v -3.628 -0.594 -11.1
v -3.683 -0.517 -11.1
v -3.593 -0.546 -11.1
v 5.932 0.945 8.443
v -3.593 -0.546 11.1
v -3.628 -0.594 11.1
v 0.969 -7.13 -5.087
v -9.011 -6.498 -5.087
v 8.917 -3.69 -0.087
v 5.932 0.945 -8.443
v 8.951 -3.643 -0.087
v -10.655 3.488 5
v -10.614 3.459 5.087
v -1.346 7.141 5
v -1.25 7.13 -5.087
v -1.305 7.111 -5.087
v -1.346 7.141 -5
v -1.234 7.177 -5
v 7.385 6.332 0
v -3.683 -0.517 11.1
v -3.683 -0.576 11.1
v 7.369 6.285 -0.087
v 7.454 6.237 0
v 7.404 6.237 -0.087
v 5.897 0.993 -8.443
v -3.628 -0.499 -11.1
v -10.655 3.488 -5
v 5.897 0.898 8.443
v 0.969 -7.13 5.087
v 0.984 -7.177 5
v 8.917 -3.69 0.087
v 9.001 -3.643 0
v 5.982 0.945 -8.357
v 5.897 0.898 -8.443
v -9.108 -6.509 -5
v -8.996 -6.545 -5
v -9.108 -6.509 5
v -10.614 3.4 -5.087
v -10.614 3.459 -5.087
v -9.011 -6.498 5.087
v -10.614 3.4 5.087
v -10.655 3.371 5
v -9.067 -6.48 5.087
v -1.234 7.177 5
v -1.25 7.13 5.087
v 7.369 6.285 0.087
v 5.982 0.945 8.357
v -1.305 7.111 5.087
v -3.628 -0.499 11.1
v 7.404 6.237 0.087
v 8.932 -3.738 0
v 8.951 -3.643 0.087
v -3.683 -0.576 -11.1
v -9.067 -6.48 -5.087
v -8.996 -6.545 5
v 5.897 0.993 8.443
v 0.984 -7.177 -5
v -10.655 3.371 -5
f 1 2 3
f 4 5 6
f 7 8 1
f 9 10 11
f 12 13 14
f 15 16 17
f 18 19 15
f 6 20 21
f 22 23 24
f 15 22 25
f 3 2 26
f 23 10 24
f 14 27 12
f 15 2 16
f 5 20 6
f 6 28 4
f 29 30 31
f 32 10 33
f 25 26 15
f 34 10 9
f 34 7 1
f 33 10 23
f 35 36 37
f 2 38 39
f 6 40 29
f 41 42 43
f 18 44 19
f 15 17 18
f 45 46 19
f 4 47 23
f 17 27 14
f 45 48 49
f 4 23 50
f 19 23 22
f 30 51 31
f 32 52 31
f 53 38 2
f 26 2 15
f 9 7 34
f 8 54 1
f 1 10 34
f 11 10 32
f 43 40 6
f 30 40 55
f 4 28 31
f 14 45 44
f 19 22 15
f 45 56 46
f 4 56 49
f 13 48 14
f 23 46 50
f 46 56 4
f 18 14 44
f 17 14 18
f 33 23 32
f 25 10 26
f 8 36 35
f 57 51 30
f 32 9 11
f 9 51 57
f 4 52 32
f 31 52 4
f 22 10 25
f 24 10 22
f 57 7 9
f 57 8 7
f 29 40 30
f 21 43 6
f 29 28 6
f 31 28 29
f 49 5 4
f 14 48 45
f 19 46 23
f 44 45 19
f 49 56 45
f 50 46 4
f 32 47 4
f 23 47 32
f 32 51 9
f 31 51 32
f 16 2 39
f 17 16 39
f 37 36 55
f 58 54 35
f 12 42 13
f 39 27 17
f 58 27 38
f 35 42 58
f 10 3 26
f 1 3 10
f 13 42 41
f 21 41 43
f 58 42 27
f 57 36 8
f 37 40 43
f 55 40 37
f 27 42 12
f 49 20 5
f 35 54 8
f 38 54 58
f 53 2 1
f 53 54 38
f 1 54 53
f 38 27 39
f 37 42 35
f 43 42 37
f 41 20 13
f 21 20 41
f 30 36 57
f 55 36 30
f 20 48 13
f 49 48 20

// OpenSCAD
// Auto-generated OpenSCAD file

    inner_points = 10*[[0.09531931272834022, -0.708217768074746, 0.49999999999998035], [-0.1265027432556592, 0.7082076393294248, 0.5000000000000197], [0.09531931272830348, -0.7082177680747239, -0.5000000000000197], [-0.12650274325569594, 0.7082076393294469, -0.49999999999998035], [-0.9026819541698768, -0.6450238500956094, 0.5000000000000183], [-1.057403067527742, 0.34293433580159893, 0.5000000000000459], [-0.9026819541699135, -0.6450238500955873, -0.4999999999999816], [-1.0574030675277786, 0.3429343358016208, -0.4999999999999542], [-0.36429558422672353, -0.054614512027756246, 1.1012960420472895], [-0.36429558422680436, -0.054614512027707784, -1.1012960420472664], [0.5881683563647194, 0.09454795600494201, 0.8356590717223468], [0.5881683563646581, 0.09454795600497881, -0.835659071722387], [0.8901105540161008, -0.36426009223040756, -4.1278652498751285e-14], [0.7353894406582356, 0.6236980936668005, -1.3844723451608184e-14]];

    outer_points = 10*[[-0.02066955875502509, 0.7082734695712609, -0.5116521782007974], [0.19691489843267096, -0.7082734695712609, -0.47269409229648607], [-0.19691489843267096, 0.7082734695712609, 0.47269409229648607], [0.02066955875502509, -0.7082734695712609, 0.5116521782007974], [-0.9371950219503415, 0.34351113745696893, -0.6757543304875785], [-0.7854296381335247, -0.6445318169533729, -0.6485810252963166], [-1.1134403616279873, 0.34351113745696893, 0.308591940009705], [-0.9616749778111705, -0.6445318169533729, 0.33576524520096696], [-0.14917650894770007, -0.05441805639996789, -1.145519356688417], [-0.537373098980239, -0.05441805639996789, 1.022593946716898], [0.7416409844661176, 0.09422163776851929, -0.7161588615966802], [0.4470789505652881, 0.09422163776851929, 0.9289969197175875], [0.7395623441727243, 0.6232908947450454, 0.13241724022144047], [0.891327727989541, -0.36475205966529645, 0.15959054541270243]];

    // Convex hull for inner set (I)
    module inner_hull() {
        hull() {
            for (p = inner_points) {
                translate(p) sphere(r=0.1);
            }
        }
    }

    // Convex hull for outer set (O) minus inner hull (O \ I)
    module outer_minus_inner() {
        difference() {
            hull() {
                for (p = outer_points) {
                    translate(p) sphere(r=0.1);
                }
            }
            inner_hull(); // Subtract inner hull
        }
    }

    // Convex hull for outer set (O) minus all translated inner hulls
    module outer_minus_AllTranslationInner() {
        difference() {
            hull() {
                for (p = outer_points) {
                    translate(p) sphere(r=0.1);
                }
            }
            hull() {
                translate([0,0,50]) inner_hull();
                translate([0,0,-50]) inner_hull();
            }; // Subtract translated inner hulls
        }
    }

    // Difference between outer_minus_inner and outer_minus_AllTranslationInner
    module outer_minus_inner_diff() {
        difference() {
            // Outer minus inner
            difference() {
                hull() {
                    for (p = outer_points) {
                        translate(p) sphere(r=0.1);
                    }
                }
                inner_hull();
            }

            // Subtract Outer minus AllTranslationInner
            difference() {
                hull() {
                    for (p = outer_points) {
                        translate(p) sphere(r=0.1);
                    }
                }
                hull() {
                    translate([0,0,50]) inner_hull();
                    translate([0,0,-50]) inner_hull();
                };
            }
        }
    }

    // Rendering all with colors applied
    color([1, 0, 0, 0.5]) inner_hull(); // Transparent red
    
